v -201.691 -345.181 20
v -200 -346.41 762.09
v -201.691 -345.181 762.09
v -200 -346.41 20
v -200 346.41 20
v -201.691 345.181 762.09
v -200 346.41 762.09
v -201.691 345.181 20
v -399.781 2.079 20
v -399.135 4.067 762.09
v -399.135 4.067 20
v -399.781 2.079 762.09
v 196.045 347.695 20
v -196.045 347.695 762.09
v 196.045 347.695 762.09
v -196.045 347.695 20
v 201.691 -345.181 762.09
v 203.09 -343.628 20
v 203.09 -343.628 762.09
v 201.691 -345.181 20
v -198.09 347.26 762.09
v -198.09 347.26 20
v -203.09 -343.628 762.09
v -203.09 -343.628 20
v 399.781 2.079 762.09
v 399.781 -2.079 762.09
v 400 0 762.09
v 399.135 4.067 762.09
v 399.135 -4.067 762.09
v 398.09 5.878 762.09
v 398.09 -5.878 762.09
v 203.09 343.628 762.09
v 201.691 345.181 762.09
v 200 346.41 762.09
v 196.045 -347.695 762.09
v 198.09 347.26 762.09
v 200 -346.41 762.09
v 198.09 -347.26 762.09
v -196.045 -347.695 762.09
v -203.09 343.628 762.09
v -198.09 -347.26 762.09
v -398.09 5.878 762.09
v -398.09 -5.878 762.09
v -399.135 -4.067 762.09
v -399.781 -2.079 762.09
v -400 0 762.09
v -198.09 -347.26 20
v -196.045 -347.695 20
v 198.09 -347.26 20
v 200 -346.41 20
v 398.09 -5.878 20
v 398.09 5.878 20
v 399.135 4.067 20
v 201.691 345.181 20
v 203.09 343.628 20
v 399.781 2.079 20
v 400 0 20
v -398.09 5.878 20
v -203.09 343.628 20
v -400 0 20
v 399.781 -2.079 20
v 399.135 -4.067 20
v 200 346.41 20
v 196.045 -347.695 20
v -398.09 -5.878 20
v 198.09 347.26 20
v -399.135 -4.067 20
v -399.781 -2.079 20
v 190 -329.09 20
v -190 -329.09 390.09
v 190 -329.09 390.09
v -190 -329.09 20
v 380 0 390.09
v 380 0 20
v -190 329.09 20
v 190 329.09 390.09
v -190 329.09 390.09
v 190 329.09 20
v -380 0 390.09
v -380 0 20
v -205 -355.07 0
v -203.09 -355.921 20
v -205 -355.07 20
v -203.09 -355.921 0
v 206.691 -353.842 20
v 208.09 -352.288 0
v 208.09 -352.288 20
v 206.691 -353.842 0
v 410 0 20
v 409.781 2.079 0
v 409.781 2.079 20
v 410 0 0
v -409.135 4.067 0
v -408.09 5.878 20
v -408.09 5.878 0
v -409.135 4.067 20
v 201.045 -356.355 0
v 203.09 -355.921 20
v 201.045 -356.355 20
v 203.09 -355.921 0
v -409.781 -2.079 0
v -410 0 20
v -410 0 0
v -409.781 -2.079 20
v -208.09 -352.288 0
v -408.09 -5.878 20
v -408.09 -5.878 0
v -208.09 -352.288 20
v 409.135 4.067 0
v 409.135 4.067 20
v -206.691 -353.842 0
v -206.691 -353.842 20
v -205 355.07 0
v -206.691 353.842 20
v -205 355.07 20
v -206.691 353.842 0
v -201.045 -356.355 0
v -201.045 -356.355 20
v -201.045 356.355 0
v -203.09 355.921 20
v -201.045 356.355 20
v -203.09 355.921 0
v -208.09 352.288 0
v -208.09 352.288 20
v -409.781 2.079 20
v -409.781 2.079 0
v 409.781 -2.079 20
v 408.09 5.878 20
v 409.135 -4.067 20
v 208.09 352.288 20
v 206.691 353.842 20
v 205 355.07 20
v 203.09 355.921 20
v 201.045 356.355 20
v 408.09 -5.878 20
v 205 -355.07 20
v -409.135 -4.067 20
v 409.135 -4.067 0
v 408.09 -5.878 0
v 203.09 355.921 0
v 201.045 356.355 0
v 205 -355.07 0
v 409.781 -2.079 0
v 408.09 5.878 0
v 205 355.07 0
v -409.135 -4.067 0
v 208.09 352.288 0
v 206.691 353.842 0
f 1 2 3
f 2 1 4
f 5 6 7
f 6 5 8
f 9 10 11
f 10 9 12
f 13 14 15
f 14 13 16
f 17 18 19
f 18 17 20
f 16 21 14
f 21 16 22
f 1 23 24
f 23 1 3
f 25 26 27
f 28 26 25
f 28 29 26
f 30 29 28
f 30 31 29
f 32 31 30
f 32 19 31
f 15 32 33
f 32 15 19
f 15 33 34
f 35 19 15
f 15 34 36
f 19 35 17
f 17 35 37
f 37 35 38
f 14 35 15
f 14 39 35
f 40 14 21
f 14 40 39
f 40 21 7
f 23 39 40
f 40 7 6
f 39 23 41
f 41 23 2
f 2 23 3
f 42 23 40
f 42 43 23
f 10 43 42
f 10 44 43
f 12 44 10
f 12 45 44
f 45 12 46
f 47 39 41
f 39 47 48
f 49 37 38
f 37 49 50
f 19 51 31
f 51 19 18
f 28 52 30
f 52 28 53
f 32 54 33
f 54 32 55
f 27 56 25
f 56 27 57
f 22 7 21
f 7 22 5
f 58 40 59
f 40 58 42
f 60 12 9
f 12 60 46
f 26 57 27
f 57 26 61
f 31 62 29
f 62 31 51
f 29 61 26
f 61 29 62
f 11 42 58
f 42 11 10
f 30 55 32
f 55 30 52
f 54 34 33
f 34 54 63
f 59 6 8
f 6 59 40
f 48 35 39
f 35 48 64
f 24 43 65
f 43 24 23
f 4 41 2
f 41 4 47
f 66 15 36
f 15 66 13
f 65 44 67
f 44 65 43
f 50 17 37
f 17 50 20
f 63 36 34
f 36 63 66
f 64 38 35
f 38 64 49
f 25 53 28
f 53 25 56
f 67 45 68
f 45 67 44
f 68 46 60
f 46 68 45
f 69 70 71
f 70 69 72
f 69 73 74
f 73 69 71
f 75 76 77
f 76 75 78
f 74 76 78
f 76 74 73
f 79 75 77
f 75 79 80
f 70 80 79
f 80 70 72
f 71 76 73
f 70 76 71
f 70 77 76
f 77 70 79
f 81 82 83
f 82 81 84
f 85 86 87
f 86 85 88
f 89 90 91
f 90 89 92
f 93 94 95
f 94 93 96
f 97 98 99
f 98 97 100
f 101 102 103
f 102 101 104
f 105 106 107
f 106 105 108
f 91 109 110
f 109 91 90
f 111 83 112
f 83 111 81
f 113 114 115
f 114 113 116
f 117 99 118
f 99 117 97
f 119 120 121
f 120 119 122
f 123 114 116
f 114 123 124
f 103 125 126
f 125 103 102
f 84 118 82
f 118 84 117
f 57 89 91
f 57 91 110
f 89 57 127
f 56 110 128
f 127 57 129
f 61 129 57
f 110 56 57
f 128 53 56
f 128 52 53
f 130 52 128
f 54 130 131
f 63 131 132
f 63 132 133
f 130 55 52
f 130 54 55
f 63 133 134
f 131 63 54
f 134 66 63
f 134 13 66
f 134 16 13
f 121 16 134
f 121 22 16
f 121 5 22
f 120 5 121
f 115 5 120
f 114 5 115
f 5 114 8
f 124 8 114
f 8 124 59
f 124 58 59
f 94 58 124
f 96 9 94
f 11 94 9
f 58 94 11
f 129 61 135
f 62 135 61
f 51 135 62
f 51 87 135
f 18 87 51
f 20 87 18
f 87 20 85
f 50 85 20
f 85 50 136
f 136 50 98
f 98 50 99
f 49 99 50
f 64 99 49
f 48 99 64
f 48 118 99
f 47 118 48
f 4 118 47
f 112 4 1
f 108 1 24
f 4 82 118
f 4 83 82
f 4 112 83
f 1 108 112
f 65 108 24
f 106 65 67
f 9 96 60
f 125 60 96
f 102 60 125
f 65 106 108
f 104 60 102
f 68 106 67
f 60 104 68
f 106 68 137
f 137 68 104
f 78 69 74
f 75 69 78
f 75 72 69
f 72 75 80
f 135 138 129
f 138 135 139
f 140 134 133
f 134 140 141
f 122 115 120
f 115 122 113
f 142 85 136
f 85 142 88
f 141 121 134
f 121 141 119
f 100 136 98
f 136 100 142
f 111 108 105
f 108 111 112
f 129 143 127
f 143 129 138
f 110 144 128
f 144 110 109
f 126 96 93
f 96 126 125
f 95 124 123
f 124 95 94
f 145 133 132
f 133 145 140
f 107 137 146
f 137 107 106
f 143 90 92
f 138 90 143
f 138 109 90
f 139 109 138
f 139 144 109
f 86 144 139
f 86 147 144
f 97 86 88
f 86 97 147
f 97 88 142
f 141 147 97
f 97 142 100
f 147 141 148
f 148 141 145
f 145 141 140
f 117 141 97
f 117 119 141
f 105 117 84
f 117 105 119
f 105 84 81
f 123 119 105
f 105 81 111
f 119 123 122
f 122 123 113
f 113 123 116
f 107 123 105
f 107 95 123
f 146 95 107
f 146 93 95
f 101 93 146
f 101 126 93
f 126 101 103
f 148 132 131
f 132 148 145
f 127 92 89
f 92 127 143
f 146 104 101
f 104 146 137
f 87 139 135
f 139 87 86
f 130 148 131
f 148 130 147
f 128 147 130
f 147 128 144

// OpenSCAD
union(){
    minkowski(){
        cylinder(r=400,h=10,$fn=6);
        cylinder(r=10,h=10);
    }
translate([0,0,0.09]){
	color("red"){
        difference(){
            minkowski(){cylinder(r=390,h=381,$fn=6);
                cylinder(r=10,h=381);}
            translate([0,0,-10]){
    cylinder(r=380,h=400,$fn=6);   
            };    
        };
    }};
};
